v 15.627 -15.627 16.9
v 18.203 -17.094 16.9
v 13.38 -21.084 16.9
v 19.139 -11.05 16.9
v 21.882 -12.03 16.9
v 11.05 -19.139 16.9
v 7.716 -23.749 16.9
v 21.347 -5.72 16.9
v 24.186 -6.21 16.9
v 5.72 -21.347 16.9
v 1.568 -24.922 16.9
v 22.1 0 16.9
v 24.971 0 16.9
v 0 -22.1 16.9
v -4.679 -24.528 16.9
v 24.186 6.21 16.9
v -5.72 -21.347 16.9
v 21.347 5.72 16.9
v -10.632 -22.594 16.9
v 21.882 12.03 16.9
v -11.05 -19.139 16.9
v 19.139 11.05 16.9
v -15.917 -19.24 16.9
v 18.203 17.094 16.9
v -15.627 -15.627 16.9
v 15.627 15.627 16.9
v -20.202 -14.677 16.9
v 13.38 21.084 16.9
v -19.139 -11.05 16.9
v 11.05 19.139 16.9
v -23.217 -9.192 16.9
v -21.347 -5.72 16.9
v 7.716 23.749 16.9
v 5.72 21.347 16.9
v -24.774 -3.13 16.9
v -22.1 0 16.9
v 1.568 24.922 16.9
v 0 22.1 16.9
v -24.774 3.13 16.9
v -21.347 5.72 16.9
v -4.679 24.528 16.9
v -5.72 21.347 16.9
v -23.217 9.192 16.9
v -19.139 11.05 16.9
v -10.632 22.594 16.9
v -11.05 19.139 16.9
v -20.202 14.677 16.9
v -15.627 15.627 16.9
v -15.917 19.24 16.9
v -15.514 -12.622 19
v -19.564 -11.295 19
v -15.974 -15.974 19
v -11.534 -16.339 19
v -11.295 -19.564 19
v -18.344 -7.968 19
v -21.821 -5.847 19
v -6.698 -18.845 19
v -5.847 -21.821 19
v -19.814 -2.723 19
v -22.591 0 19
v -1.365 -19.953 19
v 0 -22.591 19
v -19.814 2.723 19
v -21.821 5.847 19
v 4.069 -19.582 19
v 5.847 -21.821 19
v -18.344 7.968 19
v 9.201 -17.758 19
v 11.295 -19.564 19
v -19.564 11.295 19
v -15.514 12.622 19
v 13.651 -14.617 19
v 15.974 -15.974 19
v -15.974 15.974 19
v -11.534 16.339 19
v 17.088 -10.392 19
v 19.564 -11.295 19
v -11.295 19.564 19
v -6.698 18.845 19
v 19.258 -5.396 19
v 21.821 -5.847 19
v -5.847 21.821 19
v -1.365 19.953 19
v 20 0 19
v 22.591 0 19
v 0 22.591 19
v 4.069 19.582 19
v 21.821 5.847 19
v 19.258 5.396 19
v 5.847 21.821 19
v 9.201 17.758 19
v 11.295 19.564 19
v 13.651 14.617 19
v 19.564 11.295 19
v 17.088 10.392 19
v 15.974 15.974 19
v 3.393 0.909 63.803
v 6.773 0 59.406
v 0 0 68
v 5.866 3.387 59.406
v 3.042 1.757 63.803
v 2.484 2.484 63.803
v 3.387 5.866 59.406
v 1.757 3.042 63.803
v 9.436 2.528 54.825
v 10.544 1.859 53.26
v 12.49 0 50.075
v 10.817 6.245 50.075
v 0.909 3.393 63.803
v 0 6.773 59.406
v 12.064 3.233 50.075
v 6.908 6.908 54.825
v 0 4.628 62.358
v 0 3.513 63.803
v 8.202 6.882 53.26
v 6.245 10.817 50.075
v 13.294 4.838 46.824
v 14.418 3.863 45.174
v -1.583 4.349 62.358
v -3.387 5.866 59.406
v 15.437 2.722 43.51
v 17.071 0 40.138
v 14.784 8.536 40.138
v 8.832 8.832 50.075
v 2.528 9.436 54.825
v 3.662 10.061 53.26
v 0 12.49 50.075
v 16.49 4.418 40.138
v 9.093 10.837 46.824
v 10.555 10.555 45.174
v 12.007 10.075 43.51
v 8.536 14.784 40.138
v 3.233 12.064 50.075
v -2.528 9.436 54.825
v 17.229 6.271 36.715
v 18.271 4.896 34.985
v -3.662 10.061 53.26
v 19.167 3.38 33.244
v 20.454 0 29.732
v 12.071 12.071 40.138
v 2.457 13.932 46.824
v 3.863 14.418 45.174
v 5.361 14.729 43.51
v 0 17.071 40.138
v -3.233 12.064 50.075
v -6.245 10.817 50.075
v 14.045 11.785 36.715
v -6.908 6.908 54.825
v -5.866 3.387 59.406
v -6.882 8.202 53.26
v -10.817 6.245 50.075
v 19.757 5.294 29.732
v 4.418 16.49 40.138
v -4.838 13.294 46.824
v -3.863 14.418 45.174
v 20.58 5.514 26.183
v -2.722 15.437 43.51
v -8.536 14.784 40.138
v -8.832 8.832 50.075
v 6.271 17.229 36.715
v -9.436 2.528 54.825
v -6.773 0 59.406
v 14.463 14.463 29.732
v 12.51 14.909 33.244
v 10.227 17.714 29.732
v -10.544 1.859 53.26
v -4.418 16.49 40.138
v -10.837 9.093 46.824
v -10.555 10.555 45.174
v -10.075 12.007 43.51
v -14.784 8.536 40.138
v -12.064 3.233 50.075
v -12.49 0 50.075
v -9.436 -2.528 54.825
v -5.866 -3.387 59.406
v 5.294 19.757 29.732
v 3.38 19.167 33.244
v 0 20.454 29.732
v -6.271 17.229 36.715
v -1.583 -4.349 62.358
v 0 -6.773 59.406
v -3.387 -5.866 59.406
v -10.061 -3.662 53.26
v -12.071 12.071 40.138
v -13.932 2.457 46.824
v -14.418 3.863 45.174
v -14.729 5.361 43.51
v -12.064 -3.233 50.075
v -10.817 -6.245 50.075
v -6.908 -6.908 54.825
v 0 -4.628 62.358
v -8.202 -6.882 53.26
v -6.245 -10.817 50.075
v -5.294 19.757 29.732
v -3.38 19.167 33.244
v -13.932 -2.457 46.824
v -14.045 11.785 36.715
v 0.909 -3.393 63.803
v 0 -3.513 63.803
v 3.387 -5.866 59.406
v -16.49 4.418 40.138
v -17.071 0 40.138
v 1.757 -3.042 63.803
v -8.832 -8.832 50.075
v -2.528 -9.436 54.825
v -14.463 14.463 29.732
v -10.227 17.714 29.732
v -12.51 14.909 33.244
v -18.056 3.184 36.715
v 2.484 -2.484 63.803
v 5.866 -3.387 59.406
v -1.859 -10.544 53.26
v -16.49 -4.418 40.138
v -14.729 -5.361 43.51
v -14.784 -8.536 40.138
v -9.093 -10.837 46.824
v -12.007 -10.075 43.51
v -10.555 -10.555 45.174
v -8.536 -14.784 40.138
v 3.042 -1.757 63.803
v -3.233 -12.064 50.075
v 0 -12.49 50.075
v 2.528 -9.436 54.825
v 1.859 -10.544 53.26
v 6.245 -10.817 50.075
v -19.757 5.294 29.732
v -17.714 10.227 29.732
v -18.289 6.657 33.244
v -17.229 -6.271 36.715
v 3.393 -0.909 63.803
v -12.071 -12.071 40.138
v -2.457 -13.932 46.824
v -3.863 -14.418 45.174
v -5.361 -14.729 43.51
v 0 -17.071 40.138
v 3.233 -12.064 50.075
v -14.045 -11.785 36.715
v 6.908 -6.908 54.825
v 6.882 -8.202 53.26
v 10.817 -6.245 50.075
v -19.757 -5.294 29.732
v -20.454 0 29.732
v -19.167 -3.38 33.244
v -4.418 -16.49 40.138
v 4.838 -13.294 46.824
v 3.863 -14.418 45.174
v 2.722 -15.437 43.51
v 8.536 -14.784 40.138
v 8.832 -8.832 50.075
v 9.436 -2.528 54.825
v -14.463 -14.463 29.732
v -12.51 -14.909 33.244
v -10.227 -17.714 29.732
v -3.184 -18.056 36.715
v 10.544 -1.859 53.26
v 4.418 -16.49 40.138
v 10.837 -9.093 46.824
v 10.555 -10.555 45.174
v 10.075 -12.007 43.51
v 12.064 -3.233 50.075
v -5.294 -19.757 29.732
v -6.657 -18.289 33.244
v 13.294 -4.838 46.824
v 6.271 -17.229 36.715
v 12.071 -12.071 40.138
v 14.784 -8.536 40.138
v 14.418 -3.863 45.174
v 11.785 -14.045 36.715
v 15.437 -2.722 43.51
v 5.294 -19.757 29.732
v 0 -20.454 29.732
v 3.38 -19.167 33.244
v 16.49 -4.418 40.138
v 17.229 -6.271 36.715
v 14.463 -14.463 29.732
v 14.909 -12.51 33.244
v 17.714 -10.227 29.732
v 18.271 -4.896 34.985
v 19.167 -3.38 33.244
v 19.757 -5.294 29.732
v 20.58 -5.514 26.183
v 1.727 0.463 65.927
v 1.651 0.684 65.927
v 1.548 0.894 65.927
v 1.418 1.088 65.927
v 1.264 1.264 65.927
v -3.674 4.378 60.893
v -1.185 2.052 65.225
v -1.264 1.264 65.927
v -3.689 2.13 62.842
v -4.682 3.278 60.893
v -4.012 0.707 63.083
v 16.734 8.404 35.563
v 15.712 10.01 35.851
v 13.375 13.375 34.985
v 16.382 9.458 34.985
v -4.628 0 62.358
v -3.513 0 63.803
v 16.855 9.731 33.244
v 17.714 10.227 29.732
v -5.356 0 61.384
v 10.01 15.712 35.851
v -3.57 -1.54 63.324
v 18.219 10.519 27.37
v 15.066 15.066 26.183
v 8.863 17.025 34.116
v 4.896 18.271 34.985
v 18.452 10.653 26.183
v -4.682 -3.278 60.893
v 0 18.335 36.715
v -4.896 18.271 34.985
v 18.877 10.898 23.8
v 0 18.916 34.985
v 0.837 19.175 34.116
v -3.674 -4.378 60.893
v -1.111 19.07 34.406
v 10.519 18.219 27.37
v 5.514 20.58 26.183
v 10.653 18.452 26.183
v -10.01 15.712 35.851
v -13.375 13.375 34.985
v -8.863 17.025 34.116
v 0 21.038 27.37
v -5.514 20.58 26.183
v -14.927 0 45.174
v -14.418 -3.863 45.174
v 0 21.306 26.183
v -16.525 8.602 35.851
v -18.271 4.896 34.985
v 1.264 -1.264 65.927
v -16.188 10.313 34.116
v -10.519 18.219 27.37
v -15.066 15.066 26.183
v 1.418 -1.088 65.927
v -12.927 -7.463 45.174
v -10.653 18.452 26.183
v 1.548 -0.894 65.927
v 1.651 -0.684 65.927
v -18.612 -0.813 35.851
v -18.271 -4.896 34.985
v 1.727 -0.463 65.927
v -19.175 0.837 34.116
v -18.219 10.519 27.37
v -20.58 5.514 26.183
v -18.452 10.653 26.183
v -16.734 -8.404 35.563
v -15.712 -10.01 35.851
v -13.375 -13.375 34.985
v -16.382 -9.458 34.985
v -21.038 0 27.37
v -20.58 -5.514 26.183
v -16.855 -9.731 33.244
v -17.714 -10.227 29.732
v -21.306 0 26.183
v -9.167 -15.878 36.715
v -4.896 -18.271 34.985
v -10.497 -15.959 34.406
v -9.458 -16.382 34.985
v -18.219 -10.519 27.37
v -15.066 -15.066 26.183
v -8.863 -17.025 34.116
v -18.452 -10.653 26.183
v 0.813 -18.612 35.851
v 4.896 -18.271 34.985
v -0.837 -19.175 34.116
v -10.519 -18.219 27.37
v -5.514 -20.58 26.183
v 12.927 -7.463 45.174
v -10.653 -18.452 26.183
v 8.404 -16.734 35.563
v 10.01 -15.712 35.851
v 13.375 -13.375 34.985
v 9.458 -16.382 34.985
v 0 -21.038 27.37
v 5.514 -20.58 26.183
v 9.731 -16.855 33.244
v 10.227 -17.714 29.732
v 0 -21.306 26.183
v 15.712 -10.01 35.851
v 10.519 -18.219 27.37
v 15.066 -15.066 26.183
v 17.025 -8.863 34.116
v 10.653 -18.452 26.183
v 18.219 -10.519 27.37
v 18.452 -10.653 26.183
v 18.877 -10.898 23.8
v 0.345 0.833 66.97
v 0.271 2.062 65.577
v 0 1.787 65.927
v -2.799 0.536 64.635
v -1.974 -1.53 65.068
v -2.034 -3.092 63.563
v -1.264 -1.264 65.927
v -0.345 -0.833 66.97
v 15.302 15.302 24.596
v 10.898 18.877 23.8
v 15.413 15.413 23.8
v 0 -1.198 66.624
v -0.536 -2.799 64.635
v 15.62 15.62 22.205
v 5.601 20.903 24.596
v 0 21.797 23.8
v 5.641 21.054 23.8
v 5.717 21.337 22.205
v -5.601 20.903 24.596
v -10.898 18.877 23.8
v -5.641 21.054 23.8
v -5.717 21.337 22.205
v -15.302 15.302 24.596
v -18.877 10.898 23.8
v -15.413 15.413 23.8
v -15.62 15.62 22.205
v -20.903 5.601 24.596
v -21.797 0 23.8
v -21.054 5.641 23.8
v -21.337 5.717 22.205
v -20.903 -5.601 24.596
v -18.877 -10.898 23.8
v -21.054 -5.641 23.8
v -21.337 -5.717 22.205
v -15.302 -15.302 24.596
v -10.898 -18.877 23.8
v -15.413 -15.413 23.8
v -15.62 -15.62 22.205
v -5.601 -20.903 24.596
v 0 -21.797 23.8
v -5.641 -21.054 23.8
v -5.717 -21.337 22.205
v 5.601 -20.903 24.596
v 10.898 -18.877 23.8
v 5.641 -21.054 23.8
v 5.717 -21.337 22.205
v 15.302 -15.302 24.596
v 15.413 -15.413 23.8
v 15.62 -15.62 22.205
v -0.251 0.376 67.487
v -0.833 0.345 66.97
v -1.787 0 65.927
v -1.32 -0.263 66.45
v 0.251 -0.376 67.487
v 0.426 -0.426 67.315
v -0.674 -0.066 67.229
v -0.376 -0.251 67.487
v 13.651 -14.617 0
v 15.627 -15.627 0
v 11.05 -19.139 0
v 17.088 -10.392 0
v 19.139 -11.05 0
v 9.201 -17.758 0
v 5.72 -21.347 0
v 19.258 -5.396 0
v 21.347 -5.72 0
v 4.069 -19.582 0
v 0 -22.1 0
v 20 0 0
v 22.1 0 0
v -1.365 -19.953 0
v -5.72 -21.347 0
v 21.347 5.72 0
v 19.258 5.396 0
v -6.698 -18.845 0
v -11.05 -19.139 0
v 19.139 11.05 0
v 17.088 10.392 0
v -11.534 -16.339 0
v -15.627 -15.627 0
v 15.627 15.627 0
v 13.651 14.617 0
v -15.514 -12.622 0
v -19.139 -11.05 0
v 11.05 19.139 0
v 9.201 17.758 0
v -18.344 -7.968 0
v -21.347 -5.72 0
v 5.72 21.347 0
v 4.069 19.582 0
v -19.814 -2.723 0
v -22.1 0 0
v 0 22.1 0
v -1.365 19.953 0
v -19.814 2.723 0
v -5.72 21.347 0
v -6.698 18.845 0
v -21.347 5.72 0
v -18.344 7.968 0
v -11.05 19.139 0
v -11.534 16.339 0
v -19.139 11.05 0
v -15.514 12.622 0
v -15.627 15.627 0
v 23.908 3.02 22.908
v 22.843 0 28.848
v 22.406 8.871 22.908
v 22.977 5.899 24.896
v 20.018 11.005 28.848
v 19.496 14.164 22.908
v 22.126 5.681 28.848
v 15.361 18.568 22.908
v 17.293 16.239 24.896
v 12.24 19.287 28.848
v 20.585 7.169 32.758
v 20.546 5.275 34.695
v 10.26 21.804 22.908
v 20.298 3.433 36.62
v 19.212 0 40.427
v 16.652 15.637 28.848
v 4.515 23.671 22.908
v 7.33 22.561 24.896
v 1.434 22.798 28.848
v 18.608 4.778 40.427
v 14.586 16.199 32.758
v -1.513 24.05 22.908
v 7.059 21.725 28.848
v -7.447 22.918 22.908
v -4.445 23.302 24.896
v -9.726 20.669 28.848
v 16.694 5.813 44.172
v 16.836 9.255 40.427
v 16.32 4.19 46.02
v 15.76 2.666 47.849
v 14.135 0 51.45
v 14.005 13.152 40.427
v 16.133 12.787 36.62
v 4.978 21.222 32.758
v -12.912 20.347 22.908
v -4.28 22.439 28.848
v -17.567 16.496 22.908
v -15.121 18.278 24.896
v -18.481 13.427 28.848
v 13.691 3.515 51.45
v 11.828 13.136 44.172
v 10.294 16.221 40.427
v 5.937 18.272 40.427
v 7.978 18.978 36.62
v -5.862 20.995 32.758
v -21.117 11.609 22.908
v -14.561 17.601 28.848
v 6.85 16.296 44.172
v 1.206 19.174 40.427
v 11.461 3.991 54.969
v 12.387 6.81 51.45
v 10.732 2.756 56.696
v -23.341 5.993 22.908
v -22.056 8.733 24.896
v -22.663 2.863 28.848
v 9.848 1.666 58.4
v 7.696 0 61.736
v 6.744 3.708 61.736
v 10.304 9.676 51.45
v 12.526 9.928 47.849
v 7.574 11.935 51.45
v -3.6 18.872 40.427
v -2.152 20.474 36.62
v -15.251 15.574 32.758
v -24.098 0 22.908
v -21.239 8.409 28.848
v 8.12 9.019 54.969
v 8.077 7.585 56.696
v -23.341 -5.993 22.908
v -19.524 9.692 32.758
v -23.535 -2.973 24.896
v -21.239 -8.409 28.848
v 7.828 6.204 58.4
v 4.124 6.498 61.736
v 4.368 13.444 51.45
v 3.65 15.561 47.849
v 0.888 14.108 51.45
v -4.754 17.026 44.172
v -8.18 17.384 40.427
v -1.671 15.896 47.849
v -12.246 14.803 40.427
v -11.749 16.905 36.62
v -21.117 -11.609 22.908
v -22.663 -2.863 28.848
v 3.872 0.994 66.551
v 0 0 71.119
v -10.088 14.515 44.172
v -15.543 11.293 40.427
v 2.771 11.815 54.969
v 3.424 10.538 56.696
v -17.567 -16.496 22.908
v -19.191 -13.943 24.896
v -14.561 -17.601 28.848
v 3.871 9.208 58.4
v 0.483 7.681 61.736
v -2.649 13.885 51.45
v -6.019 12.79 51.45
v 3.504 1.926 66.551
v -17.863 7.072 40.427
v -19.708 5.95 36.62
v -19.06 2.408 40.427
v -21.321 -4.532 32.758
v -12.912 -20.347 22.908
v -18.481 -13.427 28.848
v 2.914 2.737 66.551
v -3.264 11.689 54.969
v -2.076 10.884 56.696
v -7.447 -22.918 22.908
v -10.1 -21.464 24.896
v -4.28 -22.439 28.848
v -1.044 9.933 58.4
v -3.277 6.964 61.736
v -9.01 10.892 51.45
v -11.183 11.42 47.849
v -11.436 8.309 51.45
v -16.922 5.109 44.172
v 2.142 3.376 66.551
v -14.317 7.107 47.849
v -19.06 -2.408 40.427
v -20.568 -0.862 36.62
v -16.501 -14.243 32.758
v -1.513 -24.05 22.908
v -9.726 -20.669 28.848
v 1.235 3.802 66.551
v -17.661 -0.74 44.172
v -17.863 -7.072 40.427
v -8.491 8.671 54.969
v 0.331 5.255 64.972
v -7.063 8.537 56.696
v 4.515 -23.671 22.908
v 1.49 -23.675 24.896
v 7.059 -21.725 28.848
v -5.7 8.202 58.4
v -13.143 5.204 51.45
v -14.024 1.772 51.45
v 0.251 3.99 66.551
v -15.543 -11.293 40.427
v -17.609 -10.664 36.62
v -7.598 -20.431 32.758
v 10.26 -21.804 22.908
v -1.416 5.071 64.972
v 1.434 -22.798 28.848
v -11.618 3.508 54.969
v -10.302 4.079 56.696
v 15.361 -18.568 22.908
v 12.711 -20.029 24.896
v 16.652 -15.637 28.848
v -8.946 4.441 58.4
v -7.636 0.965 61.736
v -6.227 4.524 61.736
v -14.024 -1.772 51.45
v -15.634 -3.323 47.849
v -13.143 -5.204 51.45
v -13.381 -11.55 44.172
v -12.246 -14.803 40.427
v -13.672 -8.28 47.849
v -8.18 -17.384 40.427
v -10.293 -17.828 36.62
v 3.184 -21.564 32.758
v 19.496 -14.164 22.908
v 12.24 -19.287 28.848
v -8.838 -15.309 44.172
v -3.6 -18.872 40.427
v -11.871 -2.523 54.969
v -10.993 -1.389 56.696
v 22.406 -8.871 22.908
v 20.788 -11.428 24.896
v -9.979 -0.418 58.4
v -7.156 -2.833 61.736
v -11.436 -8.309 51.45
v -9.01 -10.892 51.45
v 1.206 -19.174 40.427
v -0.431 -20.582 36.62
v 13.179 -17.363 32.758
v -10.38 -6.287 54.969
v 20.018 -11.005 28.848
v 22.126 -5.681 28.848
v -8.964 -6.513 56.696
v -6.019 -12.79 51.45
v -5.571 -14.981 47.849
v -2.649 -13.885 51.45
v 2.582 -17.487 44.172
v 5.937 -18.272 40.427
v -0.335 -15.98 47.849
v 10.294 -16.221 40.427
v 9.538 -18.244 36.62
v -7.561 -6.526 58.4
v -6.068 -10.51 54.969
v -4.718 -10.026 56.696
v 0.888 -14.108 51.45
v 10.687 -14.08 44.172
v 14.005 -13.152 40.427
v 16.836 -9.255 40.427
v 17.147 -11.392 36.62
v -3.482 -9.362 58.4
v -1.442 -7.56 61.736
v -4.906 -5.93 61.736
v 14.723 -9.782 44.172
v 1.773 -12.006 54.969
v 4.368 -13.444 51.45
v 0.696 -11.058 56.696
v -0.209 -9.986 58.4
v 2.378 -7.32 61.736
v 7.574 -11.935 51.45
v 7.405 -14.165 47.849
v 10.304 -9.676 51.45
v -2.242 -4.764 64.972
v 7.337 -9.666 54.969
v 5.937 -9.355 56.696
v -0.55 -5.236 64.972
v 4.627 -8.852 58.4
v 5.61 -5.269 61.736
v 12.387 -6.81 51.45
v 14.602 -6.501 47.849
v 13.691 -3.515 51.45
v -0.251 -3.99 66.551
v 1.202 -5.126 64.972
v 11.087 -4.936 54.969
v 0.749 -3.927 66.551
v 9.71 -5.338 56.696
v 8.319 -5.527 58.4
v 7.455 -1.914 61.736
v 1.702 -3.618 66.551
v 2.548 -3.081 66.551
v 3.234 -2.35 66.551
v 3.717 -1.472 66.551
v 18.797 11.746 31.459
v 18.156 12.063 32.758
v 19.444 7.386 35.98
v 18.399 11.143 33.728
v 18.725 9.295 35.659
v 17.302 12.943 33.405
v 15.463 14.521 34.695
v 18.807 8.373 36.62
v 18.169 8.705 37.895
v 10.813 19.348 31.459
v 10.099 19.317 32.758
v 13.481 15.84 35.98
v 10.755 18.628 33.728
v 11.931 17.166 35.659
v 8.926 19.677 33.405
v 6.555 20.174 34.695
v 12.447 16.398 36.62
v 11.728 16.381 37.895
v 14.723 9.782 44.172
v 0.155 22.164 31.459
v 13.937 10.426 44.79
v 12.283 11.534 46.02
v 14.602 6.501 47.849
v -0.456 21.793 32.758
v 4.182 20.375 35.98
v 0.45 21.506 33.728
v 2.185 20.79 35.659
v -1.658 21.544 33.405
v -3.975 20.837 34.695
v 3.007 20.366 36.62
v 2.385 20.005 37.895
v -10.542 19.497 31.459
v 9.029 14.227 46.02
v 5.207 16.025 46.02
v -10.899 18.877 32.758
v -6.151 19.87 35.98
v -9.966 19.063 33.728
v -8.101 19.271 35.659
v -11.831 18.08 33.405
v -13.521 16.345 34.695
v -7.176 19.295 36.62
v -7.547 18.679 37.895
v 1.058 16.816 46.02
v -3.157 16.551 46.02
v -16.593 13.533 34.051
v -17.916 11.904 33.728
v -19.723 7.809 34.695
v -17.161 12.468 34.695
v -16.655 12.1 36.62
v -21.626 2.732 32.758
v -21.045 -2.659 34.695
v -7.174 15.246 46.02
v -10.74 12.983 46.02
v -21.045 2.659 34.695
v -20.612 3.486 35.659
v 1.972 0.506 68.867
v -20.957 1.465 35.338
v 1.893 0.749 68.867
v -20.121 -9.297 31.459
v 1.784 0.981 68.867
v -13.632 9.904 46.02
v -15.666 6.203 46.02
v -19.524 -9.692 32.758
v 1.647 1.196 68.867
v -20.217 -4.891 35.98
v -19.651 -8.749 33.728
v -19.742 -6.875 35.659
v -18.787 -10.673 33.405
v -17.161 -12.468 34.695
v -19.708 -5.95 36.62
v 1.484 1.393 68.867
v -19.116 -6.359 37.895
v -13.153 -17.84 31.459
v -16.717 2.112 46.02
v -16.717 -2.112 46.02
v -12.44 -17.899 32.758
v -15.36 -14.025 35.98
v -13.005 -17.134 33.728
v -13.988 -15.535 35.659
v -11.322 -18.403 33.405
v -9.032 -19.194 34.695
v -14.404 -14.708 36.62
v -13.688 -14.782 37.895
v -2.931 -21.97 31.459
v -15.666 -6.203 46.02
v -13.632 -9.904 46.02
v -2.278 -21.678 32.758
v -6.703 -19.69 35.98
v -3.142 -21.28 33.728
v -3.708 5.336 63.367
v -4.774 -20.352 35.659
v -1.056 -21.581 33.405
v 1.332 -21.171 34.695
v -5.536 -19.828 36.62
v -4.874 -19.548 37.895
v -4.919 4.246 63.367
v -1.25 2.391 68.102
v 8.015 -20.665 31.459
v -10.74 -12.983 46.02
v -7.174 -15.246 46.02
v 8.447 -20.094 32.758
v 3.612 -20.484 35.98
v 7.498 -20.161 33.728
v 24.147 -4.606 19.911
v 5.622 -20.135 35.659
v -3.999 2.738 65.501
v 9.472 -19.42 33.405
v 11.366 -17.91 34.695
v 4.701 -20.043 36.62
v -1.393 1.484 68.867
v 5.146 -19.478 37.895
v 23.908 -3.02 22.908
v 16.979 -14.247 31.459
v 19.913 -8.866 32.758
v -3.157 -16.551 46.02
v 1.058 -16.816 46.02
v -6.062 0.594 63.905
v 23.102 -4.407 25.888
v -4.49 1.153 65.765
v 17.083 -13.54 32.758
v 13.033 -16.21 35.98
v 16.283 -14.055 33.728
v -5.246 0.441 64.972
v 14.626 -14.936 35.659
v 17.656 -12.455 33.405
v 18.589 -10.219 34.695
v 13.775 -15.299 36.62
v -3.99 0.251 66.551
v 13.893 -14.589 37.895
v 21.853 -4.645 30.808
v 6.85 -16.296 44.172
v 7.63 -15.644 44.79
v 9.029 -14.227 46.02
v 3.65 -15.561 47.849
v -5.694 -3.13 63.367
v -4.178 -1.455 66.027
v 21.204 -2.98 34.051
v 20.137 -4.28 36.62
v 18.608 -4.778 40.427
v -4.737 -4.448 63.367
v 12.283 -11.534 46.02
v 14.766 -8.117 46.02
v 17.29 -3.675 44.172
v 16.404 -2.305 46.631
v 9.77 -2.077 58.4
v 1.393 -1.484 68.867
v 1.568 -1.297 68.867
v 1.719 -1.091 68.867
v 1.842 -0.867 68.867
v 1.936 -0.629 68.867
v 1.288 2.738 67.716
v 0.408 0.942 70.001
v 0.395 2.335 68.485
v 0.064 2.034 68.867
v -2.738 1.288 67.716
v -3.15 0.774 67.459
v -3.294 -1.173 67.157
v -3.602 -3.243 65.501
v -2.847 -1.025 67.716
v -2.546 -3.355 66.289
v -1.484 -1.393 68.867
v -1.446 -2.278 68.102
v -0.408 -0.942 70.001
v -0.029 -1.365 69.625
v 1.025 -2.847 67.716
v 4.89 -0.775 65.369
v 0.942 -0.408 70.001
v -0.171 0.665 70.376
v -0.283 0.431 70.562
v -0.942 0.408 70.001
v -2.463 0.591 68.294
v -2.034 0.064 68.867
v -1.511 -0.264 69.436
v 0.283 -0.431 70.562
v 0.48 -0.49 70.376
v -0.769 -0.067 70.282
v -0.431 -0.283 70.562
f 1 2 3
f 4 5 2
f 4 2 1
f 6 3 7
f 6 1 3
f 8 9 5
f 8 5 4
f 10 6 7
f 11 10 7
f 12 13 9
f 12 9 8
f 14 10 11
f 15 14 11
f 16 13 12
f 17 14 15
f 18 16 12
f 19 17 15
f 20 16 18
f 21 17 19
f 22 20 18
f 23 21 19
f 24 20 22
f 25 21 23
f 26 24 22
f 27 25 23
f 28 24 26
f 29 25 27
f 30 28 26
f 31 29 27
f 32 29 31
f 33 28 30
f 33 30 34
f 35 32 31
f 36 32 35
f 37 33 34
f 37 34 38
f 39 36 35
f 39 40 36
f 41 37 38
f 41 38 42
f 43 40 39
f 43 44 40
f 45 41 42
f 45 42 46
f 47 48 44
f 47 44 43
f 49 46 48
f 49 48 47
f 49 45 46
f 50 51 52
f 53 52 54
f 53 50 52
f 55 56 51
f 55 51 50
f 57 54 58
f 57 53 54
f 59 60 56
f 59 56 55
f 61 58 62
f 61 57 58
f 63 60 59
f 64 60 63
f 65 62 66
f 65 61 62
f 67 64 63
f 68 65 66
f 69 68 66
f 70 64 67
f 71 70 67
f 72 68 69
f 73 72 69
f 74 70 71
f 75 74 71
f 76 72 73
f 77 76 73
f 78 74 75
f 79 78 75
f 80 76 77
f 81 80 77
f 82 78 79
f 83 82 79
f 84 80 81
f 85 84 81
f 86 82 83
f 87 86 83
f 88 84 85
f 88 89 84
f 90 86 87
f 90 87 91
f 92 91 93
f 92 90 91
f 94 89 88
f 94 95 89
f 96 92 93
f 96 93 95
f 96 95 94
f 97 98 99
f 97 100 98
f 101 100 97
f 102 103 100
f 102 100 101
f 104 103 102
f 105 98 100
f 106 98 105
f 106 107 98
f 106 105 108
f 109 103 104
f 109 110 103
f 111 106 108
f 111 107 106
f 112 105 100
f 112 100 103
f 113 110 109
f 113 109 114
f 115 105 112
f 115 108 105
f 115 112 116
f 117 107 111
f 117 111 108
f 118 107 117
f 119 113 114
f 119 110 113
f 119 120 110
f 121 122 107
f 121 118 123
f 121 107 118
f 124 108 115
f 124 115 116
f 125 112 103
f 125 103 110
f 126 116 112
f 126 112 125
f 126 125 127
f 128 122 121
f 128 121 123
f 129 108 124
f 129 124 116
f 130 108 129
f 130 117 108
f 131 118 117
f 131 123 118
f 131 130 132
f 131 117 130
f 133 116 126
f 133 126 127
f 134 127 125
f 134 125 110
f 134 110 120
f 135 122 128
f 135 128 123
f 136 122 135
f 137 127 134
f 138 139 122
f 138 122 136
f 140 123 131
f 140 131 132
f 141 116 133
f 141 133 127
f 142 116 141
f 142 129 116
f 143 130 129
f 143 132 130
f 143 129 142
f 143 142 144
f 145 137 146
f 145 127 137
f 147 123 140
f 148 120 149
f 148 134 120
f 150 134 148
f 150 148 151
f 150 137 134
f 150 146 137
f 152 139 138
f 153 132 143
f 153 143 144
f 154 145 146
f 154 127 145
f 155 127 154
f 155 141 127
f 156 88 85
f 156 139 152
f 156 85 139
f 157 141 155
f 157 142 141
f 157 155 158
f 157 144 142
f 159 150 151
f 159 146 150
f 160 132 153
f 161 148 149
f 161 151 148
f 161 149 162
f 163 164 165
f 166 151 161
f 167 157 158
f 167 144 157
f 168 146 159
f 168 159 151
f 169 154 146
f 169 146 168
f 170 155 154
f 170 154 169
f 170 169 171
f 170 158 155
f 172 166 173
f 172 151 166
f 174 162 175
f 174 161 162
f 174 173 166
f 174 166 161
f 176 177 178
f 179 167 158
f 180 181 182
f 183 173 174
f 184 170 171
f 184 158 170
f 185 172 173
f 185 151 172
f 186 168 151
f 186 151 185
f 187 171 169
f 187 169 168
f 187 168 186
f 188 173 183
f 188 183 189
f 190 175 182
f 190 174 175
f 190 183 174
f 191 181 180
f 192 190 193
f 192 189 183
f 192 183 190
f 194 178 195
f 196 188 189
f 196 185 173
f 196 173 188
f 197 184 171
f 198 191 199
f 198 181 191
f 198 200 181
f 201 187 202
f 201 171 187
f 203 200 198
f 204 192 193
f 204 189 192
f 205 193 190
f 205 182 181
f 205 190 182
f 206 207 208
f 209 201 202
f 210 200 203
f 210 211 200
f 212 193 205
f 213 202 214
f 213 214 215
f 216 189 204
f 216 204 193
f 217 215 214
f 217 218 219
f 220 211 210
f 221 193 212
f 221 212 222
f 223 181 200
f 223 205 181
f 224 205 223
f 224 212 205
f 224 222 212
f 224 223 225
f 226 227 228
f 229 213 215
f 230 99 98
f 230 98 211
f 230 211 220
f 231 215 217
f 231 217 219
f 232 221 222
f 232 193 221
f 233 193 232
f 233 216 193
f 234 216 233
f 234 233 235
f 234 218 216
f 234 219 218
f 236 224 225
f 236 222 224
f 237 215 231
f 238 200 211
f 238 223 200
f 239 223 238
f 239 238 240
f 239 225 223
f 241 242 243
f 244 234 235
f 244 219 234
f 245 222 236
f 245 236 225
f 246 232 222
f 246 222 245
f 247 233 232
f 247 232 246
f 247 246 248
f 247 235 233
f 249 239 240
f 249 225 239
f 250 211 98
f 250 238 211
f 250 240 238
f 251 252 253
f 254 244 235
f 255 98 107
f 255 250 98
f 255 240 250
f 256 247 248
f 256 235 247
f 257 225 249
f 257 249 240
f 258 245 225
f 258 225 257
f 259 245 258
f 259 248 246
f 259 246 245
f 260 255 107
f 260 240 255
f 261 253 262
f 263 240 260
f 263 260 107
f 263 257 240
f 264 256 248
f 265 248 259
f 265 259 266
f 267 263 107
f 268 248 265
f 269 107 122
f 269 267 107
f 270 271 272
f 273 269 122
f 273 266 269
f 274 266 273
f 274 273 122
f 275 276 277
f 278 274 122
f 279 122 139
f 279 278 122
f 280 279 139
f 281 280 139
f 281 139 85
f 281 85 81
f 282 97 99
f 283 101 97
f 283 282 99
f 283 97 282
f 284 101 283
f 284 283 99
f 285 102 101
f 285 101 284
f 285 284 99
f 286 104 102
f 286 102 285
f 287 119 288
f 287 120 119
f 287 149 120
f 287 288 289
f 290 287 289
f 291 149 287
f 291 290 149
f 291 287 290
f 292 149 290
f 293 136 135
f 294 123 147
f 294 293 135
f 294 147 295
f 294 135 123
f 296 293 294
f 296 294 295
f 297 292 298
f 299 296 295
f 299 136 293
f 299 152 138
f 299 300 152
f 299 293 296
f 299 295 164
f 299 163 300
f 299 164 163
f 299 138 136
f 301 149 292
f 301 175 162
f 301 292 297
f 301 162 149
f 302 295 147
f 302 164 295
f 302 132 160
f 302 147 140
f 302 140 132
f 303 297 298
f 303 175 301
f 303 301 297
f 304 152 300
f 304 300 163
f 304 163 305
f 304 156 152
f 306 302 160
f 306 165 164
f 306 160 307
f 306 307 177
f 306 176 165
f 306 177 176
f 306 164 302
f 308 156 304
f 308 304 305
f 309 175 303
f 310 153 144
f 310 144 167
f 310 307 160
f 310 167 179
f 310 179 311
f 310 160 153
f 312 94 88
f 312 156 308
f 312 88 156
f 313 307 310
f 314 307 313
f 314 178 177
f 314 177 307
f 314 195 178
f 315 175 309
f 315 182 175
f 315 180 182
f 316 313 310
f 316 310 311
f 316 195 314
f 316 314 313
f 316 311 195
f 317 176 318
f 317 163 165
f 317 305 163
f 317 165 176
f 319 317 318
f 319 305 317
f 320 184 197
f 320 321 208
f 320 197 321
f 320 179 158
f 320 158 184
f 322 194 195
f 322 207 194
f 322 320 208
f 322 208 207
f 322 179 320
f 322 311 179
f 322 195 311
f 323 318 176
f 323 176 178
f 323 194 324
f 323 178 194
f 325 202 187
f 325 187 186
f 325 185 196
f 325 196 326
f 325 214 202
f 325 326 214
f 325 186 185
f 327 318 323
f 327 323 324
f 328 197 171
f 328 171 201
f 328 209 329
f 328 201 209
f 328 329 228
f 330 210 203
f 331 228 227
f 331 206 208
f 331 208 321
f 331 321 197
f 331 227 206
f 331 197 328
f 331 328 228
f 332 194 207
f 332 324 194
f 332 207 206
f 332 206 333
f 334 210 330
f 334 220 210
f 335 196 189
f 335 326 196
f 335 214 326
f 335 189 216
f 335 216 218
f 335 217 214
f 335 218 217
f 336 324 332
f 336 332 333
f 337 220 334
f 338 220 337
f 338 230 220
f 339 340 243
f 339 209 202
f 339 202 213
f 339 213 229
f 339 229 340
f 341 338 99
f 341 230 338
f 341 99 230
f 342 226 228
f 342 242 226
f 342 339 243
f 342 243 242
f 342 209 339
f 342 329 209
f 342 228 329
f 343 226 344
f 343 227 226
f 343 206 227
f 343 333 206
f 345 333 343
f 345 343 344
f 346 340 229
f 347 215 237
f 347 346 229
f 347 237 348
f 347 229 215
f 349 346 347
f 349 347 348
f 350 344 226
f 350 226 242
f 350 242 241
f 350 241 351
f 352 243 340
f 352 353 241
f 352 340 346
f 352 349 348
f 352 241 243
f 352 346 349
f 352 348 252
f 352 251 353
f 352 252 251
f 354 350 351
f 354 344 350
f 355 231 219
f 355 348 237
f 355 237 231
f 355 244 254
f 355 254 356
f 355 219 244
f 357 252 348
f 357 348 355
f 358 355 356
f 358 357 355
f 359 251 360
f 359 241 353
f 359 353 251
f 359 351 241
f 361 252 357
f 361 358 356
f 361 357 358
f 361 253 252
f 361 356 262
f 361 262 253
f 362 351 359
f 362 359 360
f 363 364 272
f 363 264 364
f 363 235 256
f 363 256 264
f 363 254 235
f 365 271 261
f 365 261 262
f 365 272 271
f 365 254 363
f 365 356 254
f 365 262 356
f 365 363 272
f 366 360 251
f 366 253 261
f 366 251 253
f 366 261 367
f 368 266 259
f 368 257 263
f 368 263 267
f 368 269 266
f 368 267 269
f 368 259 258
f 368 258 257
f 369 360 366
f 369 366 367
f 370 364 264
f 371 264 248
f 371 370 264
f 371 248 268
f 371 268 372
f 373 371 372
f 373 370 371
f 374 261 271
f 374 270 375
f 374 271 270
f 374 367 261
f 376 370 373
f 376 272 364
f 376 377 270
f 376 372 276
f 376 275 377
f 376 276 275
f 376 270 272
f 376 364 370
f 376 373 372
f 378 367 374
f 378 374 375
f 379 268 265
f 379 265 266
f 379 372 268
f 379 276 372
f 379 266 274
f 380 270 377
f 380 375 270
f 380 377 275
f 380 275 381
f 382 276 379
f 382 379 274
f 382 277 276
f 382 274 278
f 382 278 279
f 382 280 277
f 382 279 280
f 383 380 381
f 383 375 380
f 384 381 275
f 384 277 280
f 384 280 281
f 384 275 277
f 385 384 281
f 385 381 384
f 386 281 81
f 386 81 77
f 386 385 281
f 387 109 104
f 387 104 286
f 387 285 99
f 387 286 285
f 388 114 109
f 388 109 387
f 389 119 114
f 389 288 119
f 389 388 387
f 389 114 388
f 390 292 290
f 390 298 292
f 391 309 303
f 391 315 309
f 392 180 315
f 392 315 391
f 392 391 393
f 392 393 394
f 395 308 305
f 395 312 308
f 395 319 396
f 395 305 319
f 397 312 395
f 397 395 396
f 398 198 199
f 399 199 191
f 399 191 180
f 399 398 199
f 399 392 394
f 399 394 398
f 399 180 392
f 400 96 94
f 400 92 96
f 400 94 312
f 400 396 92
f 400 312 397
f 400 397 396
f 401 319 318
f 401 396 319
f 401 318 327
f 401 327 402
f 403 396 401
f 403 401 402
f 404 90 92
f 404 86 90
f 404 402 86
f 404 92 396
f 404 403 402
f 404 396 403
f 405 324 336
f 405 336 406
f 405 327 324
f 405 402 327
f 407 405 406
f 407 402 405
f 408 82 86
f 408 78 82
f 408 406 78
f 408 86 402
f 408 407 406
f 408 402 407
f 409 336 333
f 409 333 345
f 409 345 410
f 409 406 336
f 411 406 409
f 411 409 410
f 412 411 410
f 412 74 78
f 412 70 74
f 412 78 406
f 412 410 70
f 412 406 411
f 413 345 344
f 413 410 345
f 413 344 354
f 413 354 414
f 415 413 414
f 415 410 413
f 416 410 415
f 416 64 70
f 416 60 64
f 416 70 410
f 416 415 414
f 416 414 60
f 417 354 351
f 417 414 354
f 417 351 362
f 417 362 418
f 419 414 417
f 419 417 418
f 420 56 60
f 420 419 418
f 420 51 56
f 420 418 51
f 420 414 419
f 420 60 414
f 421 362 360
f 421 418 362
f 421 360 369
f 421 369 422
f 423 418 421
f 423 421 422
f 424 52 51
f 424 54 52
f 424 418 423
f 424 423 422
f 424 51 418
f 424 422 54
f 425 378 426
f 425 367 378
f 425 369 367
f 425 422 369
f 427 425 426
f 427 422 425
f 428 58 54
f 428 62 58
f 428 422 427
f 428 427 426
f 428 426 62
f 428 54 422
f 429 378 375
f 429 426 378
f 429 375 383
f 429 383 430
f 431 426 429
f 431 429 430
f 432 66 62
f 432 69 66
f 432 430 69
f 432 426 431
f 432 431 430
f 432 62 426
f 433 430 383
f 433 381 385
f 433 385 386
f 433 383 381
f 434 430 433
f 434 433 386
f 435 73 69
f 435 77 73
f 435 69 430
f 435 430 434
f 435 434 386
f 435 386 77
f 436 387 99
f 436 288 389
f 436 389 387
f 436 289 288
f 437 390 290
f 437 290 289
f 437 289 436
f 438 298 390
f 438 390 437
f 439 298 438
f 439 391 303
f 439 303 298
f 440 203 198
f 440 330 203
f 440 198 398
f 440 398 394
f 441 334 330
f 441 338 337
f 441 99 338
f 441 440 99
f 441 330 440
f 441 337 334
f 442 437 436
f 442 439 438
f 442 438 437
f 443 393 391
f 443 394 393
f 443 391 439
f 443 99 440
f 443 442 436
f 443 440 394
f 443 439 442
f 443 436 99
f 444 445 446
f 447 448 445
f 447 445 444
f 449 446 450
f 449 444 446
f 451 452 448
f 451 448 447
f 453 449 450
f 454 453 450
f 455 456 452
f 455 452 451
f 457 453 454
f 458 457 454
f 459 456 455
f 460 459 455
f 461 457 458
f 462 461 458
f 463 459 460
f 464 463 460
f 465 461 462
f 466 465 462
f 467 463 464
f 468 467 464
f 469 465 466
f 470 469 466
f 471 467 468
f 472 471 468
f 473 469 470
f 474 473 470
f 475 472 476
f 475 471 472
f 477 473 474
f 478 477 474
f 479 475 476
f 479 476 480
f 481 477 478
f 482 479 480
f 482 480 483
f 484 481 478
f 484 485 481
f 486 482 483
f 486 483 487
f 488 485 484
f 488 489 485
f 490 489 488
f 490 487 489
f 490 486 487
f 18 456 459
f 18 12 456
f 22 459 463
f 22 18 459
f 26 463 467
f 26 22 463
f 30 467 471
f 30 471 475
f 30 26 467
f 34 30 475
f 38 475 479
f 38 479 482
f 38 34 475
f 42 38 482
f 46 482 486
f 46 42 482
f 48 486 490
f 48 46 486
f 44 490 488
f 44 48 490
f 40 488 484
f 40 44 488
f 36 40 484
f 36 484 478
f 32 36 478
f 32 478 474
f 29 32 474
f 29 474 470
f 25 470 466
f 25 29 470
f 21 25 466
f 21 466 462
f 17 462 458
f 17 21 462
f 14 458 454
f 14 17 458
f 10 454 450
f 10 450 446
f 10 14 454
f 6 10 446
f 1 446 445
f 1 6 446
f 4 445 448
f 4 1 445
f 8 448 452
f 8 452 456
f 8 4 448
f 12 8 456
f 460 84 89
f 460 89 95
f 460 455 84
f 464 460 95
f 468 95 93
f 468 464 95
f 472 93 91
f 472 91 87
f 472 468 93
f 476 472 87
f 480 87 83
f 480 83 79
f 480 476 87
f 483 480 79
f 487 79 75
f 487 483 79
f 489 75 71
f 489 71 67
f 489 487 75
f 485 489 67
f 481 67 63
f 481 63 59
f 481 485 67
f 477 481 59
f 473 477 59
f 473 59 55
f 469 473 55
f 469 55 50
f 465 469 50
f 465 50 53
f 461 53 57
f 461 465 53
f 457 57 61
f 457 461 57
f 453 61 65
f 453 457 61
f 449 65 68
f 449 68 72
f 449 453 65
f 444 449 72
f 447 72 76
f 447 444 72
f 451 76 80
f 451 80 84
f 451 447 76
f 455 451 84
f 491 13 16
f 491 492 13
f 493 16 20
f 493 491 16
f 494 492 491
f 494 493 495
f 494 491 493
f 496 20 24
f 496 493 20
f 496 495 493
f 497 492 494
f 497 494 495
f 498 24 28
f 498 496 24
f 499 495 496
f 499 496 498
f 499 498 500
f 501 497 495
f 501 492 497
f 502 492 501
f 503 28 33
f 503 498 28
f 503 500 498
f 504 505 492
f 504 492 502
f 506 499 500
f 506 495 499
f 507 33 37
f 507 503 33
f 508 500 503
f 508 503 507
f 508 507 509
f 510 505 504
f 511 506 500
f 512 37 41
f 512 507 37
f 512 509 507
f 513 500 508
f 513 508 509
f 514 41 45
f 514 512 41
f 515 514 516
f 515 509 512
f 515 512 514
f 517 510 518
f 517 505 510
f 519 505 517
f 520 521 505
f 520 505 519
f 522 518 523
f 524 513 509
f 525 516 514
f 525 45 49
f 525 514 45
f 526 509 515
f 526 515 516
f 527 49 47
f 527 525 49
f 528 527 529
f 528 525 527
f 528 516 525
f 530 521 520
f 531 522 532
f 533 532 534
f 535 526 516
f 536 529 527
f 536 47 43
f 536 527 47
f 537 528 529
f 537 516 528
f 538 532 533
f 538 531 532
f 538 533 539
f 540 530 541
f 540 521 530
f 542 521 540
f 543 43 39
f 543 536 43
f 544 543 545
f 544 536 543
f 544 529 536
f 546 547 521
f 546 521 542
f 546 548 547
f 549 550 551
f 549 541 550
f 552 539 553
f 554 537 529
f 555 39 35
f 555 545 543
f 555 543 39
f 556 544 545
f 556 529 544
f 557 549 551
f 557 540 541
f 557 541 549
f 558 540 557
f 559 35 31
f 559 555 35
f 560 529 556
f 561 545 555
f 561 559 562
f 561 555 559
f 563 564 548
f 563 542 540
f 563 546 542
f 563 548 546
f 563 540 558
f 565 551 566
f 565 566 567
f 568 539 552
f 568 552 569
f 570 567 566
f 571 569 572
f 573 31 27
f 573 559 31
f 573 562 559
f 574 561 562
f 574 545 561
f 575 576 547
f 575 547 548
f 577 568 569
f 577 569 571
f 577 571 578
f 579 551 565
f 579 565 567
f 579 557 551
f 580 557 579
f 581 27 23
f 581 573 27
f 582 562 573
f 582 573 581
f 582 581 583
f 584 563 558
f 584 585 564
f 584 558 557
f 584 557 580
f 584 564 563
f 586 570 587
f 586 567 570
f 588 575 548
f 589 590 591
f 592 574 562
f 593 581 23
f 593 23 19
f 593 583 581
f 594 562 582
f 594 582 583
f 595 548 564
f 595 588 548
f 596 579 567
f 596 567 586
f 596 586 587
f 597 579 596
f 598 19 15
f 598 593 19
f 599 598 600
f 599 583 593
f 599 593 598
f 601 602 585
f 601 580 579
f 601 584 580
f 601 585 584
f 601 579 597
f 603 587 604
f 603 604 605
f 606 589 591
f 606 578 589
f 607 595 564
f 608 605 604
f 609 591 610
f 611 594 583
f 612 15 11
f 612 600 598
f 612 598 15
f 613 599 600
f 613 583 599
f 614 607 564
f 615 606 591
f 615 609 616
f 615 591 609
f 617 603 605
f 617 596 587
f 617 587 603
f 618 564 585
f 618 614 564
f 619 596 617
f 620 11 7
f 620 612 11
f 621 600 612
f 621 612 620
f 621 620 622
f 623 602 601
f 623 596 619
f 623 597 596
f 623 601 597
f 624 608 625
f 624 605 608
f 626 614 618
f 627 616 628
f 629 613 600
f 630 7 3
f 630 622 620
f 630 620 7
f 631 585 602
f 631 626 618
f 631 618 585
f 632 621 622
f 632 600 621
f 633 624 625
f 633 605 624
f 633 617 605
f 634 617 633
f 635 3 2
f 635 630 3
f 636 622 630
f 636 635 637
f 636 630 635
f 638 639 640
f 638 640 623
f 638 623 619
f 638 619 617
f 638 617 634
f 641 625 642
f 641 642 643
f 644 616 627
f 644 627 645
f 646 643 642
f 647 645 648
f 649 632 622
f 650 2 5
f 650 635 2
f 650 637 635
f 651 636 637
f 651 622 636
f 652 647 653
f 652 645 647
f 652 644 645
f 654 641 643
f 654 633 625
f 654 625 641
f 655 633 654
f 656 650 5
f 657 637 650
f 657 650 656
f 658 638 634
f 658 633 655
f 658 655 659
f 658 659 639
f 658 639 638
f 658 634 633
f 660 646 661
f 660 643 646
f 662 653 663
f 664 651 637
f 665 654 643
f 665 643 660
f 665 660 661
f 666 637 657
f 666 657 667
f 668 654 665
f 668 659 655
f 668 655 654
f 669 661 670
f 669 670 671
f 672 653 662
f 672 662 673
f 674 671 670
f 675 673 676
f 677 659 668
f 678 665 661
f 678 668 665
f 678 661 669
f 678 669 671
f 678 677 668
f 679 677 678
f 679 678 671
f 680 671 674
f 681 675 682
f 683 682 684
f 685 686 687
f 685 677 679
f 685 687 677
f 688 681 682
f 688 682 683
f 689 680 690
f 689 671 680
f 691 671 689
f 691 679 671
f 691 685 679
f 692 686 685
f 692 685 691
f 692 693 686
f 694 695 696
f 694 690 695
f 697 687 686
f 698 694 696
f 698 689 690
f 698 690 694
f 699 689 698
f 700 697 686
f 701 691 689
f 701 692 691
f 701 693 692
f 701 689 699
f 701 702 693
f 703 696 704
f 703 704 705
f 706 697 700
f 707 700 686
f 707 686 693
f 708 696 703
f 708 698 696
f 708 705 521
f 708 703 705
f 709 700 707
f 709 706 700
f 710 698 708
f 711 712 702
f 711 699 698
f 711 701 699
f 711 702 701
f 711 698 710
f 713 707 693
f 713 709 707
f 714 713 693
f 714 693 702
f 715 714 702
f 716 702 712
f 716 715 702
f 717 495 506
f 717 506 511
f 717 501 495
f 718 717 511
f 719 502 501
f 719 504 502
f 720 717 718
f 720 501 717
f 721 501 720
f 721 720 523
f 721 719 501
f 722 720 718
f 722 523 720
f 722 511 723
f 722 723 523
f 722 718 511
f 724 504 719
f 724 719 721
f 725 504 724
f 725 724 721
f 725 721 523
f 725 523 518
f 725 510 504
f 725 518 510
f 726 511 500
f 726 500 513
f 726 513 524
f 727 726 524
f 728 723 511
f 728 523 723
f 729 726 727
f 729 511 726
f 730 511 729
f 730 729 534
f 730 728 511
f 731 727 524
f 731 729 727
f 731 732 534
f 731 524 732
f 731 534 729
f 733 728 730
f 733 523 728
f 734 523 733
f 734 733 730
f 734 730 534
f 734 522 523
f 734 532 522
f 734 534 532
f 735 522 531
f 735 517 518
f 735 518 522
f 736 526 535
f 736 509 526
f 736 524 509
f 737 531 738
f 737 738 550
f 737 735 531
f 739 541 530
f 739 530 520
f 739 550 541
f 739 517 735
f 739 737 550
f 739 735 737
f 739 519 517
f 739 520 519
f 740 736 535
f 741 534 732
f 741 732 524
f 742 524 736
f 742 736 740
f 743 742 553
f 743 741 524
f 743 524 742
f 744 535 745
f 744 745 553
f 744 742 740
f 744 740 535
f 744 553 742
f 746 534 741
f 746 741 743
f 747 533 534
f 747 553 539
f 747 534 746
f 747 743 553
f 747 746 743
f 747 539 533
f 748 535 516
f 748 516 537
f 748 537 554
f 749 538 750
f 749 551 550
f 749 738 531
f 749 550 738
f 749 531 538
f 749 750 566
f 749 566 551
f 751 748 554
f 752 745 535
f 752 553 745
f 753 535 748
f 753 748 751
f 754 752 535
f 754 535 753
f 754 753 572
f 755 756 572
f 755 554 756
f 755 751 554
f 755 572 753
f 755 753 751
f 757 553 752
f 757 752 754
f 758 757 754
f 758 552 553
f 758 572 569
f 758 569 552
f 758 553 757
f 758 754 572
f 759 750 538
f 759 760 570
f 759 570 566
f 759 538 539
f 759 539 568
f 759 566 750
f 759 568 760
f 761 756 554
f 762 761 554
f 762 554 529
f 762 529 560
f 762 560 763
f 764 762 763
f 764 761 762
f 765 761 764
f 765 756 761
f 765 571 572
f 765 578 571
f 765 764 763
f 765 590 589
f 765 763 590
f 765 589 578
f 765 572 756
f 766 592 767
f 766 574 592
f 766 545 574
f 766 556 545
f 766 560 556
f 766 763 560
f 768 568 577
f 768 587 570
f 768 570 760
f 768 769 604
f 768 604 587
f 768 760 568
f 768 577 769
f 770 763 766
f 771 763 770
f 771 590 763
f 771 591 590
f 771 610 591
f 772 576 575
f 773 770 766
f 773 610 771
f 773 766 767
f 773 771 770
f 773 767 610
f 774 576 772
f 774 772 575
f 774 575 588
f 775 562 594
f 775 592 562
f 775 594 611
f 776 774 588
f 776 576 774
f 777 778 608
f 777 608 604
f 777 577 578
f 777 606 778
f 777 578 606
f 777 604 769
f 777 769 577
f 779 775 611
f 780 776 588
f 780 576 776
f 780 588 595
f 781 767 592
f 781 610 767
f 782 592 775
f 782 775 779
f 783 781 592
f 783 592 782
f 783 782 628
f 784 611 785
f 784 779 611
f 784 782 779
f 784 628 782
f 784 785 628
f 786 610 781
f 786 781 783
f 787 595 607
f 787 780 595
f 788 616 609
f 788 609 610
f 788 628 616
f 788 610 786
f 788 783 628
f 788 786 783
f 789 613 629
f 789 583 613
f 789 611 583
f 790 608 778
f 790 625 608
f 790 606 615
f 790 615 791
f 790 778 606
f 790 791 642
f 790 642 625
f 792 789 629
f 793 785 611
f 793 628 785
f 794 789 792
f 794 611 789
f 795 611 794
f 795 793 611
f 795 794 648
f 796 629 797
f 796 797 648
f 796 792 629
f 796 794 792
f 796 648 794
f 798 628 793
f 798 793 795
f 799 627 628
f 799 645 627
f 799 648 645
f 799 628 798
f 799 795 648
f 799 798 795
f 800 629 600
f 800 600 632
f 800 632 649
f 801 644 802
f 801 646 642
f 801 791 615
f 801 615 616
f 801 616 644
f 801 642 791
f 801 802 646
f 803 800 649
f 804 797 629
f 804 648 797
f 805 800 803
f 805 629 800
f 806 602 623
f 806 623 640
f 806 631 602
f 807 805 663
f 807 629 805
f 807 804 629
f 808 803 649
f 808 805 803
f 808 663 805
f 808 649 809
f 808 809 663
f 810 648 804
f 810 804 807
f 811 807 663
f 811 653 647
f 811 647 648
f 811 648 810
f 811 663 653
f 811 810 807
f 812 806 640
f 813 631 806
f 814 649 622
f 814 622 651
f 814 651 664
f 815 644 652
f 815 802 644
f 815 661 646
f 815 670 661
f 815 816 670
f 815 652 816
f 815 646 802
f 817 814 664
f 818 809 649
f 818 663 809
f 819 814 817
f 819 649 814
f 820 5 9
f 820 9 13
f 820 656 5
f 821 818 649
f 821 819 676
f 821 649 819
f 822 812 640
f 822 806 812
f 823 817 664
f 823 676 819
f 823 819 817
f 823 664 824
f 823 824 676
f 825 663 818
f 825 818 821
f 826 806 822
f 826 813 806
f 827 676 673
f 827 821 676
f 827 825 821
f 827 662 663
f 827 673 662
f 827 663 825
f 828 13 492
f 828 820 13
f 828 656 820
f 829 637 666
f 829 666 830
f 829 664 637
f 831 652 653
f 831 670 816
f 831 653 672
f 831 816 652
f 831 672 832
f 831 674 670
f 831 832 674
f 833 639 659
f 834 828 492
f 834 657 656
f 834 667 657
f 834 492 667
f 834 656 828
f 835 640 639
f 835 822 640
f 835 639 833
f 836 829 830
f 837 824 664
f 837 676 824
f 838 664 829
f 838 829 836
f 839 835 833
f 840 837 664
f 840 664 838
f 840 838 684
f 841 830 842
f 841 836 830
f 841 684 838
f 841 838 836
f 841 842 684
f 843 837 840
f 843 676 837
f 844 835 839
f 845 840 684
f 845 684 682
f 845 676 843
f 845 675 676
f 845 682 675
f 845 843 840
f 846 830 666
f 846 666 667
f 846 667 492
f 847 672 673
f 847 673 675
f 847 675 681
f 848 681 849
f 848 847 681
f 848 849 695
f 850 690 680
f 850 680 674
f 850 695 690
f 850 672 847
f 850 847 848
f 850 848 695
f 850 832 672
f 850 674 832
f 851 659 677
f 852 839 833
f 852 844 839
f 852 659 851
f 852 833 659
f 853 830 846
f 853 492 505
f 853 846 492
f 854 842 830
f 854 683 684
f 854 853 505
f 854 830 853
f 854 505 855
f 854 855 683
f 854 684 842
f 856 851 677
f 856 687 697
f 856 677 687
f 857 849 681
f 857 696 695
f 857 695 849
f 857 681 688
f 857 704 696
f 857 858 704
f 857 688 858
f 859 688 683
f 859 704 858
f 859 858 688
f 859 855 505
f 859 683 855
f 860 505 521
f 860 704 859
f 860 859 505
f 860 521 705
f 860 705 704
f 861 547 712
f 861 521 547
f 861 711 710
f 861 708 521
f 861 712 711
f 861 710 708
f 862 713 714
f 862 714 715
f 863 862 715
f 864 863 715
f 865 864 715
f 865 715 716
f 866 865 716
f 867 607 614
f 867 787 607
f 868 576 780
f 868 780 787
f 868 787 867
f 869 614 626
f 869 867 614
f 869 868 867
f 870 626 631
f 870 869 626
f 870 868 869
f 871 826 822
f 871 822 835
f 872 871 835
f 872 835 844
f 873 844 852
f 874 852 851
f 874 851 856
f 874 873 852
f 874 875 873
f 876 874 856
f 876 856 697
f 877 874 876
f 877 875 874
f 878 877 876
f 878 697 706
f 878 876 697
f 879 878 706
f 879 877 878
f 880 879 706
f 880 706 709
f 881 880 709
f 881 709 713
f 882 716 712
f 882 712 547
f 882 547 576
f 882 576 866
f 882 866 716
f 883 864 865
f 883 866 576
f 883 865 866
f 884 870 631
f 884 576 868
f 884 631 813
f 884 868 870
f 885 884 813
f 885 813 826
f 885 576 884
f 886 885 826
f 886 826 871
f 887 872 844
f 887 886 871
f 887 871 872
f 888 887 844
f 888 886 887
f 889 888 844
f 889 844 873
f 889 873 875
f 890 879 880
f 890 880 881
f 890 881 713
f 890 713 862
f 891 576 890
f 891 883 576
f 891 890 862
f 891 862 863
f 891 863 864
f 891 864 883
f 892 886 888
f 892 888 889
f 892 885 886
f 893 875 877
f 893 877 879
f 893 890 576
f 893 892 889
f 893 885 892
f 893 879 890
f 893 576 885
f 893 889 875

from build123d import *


with BuildPart() as f1:
    # F0 (on Front) → F1 (revolve)
    with BuildSketch(Plane.XZ):
        with BuildLine():
            Line((20, 19), (20, 0))
            Line((20, 0), (22.100001, 0))
            Line((22.100001, 0), (22.100001, 16.899999))
            Line((22.100001, 16.899999), (24.970786, 16.899999))
            ThreePointArc((24.970786, 16.899999), (16.849712, 46.019526), (0, 71.119045))
            Line((0, 71.119045), (0, 68))
            ThreePointArc((0, 68), (14.926953, 45.174321), (22.590533, 19))
            Line((22.590533, 19), (20, 19))
        make_face()
    revolve(axis=Axis((0, 0, 34), (0, 0, 1)))


solid = f1.part
